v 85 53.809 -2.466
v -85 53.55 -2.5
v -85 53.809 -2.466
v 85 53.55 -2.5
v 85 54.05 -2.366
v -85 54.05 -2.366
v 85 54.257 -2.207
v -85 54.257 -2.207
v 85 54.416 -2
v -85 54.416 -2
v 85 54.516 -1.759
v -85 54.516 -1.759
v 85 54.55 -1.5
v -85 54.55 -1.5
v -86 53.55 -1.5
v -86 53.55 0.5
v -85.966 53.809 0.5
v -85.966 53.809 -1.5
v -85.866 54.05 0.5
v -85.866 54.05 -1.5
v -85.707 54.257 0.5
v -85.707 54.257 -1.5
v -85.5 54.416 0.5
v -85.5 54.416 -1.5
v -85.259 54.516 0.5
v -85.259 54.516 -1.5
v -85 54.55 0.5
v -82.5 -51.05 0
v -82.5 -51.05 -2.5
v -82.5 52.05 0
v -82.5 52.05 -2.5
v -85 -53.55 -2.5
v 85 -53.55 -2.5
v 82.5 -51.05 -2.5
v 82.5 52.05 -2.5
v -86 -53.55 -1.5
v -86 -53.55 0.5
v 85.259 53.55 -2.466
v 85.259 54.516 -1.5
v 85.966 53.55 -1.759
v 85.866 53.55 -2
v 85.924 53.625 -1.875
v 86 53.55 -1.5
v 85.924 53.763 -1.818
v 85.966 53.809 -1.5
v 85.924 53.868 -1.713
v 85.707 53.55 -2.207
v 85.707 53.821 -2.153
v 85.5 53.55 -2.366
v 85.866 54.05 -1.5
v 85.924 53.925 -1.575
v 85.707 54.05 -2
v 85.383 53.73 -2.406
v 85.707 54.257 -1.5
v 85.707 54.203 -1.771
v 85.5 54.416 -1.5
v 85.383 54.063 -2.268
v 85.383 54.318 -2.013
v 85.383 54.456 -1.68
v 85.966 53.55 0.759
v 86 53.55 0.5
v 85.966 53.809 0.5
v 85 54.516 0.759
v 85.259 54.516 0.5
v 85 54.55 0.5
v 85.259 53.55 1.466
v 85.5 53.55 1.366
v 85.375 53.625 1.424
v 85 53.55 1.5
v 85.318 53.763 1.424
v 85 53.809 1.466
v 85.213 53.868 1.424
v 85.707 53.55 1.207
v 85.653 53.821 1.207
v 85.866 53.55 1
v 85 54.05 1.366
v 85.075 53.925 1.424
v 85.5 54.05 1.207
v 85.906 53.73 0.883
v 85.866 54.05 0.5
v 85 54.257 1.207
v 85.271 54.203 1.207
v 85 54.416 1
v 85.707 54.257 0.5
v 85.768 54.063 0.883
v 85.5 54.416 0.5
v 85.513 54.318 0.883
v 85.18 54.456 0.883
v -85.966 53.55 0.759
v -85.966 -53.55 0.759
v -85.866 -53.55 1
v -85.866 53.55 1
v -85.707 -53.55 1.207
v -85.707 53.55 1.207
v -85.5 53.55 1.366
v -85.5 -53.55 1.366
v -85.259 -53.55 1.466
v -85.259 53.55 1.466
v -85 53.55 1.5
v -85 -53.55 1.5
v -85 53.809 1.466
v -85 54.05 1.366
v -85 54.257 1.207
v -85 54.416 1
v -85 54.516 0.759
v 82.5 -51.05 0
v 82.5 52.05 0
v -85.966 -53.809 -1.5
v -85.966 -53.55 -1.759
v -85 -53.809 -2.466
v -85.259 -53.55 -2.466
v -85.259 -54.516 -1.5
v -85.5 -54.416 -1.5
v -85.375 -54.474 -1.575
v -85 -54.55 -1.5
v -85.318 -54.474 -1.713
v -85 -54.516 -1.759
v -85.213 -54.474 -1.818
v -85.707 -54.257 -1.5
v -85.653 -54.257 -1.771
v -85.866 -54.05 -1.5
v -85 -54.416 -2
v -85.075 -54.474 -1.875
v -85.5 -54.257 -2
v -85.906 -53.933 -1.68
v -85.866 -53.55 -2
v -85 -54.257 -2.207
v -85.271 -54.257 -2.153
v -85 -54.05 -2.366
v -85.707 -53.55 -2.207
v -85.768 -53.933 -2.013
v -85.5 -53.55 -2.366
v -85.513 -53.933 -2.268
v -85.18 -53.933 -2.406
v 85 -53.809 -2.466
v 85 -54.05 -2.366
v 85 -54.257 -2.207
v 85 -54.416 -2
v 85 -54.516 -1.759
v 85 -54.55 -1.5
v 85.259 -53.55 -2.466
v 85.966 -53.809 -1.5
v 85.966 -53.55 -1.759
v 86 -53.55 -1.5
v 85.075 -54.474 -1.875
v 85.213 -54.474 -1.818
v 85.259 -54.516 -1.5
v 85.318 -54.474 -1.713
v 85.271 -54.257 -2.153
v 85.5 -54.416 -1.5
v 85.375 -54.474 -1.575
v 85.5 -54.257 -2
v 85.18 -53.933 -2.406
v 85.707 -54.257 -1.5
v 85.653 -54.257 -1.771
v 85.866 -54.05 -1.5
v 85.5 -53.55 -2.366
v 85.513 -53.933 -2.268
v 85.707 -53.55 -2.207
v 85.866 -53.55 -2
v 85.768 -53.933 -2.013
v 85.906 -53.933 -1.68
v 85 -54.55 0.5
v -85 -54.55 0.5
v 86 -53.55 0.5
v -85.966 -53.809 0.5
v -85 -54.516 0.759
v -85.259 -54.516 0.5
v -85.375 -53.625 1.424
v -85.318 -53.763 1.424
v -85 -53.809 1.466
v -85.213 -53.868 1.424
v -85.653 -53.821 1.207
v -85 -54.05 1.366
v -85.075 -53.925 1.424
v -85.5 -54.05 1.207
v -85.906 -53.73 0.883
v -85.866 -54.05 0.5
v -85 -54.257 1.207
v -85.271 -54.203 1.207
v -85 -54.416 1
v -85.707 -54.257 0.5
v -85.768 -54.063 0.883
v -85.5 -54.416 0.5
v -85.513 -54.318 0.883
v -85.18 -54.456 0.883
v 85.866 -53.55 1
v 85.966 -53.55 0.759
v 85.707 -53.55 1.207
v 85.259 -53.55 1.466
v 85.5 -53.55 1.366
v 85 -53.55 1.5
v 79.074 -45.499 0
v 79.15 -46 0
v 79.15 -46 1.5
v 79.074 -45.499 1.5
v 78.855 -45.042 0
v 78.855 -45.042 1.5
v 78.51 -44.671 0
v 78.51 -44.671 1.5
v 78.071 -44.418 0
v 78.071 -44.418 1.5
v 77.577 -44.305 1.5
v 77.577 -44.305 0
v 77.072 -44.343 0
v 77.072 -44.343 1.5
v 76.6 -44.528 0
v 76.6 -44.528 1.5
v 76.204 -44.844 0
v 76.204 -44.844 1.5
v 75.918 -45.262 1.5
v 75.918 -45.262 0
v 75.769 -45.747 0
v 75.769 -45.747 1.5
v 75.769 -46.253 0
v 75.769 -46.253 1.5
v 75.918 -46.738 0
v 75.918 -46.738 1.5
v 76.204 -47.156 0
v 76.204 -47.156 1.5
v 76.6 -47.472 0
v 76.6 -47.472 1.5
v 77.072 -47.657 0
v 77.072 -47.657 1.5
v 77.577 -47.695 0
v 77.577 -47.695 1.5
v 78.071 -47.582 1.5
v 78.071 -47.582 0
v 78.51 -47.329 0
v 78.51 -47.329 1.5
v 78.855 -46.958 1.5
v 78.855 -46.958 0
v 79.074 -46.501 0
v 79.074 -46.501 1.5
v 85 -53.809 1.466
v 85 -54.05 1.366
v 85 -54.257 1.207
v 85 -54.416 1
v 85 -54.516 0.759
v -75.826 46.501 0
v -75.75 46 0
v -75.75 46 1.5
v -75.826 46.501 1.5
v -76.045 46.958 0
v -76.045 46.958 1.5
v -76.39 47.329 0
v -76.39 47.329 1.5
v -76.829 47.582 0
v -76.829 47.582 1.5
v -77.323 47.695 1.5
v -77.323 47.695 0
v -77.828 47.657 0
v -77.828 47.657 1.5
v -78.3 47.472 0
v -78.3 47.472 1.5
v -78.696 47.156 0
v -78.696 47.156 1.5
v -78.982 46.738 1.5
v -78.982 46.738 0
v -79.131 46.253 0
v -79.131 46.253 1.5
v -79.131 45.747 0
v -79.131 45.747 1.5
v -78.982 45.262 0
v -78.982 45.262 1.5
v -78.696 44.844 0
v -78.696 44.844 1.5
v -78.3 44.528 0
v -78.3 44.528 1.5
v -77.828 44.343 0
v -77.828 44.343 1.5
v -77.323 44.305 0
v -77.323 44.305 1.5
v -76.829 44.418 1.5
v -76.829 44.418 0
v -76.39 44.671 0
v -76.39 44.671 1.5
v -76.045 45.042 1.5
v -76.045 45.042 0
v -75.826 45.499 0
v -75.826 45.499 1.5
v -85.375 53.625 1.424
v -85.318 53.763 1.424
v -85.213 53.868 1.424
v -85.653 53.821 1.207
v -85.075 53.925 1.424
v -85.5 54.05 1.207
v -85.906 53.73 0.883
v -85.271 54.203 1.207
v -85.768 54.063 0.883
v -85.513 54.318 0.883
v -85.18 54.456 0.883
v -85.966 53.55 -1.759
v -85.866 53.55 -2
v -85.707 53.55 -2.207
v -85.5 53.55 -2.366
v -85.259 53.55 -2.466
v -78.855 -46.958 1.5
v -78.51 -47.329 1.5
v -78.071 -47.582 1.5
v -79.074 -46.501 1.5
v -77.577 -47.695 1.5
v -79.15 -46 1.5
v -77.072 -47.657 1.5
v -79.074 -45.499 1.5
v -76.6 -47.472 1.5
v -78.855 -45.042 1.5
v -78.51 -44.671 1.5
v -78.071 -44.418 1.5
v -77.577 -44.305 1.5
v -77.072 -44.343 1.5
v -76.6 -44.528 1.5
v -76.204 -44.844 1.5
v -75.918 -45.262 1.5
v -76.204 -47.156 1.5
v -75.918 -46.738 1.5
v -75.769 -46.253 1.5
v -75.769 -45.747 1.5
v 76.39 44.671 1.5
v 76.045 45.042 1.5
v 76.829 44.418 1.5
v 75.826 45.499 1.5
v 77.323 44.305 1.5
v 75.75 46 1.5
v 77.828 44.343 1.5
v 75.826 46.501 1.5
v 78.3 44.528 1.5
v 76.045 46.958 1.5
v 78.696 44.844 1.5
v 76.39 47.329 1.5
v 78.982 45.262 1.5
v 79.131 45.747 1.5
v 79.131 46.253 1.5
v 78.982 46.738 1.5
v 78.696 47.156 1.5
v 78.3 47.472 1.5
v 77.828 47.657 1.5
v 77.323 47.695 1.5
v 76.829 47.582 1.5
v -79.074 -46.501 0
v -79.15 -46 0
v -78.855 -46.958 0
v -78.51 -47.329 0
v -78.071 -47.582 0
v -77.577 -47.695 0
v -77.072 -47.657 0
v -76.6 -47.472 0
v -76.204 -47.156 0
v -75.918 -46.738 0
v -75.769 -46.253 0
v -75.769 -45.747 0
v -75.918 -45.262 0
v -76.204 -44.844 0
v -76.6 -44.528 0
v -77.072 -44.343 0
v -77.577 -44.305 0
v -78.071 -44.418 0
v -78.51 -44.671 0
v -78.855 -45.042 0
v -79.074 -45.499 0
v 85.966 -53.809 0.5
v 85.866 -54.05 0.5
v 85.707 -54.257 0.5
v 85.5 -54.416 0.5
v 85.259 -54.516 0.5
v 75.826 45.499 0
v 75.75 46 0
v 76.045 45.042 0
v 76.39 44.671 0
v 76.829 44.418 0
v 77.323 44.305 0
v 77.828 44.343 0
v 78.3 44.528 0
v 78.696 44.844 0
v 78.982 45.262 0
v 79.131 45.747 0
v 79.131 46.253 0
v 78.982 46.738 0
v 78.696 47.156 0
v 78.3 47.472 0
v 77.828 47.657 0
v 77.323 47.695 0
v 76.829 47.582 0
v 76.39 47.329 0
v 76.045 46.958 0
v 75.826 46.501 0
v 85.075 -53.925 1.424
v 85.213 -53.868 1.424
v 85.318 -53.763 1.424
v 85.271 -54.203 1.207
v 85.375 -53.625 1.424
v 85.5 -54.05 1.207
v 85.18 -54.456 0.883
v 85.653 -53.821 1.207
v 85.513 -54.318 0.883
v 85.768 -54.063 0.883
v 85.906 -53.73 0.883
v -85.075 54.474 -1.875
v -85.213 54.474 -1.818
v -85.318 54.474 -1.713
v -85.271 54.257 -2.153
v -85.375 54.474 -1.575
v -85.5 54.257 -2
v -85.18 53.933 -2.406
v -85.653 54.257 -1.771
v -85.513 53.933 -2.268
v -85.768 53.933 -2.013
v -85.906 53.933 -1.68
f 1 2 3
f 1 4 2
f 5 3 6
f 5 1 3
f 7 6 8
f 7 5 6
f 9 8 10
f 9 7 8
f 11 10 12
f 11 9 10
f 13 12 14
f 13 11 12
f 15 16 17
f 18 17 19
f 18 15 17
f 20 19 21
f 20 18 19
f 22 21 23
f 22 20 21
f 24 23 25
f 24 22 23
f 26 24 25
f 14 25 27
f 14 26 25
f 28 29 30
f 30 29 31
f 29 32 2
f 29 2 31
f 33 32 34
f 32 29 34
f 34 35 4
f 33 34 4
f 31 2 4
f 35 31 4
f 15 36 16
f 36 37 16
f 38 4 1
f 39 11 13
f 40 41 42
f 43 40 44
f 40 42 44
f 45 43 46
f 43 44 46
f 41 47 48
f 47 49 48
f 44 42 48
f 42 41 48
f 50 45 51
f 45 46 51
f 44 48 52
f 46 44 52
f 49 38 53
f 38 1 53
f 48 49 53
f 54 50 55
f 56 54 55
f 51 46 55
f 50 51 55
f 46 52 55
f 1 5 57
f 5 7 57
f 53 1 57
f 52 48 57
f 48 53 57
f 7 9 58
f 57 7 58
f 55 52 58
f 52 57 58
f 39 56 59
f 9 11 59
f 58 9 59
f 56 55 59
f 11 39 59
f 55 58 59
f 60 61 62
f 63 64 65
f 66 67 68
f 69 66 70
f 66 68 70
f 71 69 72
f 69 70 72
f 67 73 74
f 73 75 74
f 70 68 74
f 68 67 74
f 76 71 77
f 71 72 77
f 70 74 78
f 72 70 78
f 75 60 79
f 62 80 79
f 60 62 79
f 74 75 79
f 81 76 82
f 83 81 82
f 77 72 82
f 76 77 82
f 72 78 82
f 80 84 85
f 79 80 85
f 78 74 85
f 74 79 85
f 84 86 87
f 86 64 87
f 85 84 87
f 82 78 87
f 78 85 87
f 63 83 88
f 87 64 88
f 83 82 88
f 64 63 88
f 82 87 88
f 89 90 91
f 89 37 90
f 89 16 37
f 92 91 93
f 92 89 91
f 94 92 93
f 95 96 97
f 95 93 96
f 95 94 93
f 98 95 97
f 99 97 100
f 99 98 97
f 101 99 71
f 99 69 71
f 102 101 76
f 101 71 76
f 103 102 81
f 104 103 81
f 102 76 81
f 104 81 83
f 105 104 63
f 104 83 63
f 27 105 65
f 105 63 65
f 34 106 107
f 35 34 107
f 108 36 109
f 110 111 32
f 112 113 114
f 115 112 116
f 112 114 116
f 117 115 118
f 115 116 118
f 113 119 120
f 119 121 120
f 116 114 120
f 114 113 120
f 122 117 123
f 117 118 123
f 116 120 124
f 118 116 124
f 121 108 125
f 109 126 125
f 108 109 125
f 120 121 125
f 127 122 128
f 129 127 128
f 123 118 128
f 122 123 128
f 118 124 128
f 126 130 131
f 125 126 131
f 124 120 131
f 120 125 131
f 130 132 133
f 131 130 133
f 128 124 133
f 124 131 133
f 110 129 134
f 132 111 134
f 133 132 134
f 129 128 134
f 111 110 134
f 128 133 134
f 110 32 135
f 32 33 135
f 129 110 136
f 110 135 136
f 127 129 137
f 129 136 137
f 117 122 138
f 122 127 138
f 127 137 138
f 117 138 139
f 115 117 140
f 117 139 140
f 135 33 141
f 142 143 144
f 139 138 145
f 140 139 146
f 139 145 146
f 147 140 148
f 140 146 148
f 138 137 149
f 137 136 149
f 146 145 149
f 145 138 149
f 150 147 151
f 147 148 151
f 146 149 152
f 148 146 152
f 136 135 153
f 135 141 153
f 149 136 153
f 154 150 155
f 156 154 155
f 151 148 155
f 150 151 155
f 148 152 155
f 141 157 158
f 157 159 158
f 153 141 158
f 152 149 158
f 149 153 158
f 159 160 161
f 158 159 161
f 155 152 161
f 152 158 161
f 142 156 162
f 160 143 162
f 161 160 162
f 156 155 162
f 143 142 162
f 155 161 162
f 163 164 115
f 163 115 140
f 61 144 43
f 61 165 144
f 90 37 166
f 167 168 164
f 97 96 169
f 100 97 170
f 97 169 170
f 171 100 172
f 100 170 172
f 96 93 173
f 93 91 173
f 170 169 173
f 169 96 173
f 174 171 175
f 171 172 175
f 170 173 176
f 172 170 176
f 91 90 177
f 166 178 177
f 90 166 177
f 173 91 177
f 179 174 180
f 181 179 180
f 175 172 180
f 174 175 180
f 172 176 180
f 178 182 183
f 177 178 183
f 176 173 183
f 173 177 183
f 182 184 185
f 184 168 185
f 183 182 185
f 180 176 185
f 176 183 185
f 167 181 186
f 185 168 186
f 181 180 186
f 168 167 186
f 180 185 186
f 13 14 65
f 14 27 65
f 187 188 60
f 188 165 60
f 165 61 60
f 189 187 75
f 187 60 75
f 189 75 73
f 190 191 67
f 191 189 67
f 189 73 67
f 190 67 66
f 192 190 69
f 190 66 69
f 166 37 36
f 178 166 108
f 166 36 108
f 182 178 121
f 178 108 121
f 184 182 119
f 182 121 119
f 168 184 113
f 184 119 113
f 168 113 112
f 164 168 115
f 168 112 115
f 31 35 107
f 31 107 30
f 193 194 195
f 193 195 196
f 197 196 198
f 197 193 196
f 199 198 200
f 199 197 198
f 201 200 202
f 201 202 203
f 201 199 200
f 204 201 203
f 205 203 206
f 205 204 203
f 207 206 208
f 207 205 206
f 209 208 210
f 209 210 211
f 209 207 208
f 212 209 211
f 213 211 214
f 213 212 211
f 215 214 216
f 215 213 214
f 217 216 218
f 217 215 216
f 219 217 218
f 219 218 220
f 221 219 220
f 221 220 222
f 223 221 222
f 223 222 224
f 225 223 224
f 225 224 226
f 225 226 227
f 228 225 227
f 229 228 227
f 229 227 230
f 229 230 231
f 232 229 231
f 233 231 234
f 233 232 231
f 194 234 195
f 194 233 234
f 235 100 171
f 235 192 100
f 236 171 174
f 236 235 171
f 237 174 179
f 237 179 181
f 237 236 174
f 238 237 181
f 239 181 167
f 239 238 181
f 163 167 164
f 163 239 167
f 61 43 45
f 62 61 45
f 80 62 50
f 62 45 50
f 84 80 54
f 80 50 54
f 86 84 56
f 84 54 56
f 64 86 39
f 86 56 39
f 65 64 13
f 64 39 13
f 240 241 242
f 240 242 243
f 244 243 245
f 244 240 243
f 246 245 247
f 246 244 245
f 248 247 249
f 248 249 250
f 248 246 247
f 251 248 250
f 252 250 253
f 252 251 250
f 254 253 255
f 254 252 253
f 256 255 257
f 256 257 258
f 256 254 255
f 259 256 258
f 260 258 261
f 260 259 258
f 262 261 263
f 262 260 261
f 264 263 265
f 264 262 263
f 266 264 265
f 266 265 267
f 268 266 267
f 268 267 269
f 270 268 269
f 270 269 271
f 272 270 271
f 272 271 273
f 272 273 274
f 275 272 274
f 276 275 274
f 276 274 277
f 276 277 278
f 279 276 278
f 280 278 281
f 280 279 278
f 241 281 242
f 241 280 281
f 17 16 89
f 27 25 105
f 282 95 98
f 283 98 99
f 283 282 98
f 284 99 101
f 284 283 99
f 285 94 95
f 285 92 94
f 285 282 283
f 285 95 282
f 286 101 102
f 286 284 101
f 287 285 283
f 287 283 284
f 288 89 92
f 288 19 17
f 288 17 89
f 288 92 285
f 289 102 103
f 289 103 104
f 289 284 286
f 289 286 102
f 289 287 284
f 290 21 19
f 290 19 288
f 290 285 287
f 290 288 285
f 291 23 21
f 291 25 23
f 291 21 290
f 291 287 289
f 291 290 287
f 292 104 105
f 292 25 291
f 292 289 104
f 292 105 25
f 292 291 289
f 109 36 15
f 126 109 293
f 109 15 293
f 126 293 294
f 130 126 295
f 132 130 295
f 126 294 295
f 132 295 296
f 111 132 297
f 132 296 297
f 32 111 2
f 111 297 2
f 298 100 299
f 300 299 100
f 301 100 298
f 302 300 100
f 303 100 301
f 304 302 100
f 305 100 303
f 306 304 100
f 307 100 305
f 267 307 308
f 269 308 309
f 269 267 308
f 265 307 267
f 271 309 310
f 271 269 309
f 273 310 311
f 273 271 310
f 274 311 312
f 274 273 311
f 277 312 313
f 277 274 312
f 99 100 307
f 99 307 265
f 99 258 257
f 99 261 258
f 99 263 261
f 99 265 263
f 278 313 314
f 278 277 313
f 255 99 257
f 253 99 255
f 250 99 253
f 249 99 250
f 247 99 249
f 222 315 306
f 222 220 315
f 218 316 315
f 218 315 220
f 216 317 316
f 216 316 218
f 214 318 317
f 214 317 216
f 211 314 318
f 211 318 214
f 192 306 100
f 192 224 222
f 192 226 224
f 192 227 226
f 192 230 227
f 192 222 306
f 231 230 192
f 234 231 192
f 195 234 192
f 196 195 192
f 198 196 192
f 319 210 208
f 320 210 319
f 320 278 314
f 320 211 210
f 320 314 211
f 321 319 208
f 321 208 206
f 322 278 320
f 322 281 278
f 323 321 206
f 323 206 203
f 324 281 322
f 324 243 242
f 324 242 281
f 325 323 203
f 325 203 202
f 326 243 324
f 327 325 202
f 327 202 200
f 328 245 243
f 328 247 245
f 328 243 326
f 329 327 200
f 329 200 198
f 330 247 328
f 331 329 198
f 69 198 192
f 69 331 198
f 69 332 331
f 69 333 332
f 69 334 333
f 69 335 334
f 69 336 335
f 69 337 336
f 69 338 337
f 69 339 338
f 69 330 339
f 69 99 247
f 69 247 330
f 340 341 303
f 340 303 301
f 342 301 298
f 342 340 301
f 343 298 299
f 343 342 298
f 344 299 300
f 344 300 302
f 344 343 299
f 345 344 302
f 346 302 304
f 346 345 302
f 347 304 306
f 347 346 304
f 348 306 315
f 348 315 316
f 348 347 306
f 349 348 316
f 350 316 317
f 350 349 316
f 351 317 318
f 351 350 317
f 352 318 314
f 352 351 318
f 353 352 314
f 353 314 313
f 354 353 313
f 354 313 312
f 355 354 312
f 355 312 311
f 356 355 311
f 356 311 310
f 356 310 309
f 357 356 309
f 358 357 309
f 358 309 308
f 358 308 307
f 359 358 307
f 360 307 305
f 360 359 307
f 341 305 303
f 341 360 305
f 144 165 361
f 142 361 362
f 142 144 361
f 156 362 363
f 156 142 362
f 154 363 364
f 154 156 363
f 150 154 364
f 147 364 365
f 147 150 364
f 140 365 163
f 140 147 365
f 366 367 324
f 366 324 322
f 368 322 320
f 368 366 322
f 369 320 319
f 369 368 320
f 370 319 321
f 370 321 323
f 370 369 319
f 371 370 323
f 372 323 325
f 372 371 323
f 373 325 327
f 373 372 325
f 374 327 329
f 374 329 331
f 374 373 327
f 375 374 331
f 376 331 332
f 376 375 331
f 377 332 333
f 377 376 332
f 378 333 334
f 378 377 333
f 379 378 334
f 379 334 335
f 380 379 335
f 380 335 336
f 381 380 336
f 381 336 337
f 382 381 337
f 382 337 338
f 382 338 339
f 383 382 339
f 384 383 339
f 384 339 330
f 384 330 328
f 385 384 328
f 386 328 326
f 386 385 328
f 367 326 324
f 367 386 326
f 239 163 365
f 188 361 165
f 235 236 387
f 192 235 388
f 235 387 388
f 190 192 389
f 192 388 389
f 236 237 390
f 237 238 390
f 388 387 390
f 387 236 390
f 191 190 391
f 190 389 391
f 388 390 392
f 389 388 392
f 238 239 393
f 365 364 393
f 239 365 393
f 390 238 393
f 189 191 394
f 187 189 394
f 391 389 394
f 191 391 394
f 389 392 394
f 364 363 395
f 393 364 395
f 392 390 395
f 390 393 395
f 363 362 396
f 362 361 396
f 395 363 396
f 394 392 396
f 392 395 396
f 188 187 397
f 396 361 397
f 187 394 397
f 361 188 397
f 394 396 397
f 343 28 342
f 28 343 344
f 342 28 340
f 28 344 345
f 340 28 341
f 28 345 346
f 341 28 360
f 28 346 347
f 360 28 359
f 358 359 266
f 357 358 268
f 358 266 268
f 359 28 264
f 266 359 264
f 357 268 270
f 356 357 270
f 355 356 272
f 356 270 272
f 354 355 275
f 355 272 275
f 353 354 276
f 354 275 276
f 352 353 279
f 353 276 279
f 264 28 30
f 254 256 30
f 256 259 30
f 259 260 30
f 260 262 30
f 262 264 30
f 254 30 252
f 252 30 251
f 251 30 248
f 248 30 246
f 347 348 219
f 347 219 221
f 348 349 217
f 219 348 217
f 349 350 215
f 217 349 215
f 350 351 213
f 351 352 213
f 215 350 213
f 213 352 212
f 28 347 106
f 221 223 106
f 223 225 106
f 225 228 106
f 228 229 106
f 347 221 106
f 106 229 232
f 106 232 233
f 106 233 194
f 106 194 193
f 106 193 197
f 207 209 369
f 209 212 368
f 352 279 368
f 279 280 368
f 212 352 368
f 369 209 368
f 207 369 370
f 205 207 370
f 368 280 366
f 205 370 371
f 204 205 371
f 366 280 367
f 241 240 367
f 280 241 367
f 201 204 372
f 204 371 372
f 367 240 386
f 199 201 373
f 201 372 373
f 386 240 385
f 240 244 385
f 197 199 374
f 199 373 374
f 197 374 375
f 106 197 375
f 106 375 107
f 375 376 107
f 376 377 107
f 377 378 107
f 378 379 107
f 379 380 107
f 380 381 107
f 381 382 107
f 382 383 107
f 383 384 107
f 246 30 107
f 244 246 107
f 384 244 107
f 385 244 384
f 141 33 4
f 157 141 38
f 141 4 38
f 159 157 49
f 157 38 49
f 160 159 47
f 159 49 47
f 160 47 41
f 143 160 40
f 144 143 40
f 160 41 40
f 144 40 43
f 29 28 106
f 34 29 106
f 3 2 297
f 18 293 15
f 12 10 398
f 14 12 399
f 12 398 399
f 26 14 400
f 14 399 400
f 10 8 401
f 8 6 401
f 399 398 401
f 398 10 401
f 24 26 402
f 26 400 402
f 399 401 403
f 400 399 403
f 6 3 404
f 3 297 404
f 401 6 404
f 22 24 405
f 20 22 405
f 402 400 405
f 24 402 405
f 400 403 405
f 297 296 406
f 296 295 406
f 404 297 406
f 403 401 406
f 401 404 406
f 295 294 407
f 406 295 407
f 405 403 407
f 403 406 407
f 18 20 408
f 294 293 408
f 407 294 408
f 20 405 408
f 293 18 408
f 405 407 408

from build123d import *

# Parameters (mm, degrees)
SKETCH1_W           = 165
SKETCH1_H           = 102.1
SKETCH1_R           = 1.7
BOSS_EXTRUDE1_DEPTH = 1.5
SKETCH2_W           = 172
SKETCH2_H           = 109.1
SKETCH2_W_2         = 165
SKETCH2_H_2         = 102.1
BOSS_EXTRUDE2_DEPTH = 4
SKETCH3_W           = 165
SKETCH3_H           = 1
CUT_EXTRUDE1_DEPTH  = 2.5
FILLET1_R           = 1


with BuildPart() as part:
    # Sketch1 → Boss-Extrude1 (new body)
    with BuildSketch(Plane.XY):
        Rectangle(SKETCH1_W, SKETCH1_H)
        with Locations((-77.45, 46)):
            Circle(SKETCH1_R, mode=Mode.SUBTRACT)
        with Locations(Location((77.45, 46, 0), (0, 0, 180))):
            Circle(SKETCH1_R, mode=Mode.SUBTRACT)
        with Locations((77.45, -46)):
            Circle(SKETCH1_R, mode=Mode.SUBTRACT)
        with Locations(Location((-77.45, -46, 0), (0, 0, 180))):
            Circle(SKETCH1_R, mode=Mode.SUBTRACT)
    extrude(amount=BOSS_EXTRUDE1_DEPTH)

    # Sketch2 → Boss-Extrude2 (add)
    with BuildSketch(Plane.XY.offset(1.5)):
        Rectangle(SKETCH2_W, SKETCH2_H)
        Rectangle(SKETCH2_W_2, SKETCH2_H_2, mode=Mode.SUBTRACT)
    extrude(amount=-BOSS_EXTRUDE2_DEPTH)

    # Sketch3 → Cut-Extrude1 (cut)
    with BuildSketch(Plane(origin=(0, 0, -2.5), x_dir=(-1, 0, 0), z_dir=(0, 0, -1))):
        with Locations((0, 51.55)):
            Rectangle(SKETCH3_W, SKETCH3_H)
    extrude(amount=-CUT_EXTRUDE1_DEPTH, mode=Mode.SUBTRACT)

    # Fillet1
    fillet1_edges = [part.edges().sort_by_distance(p)[0] for p in [
        (-86, 0, -2.5),
        (-86, -54.55, -0.5),
        (0, 54.55, -2.5),
        (-86, 54.55, -0.5),
        (86, 0, -2.5),
        (86, 54.55, -0.5),
        (0, -54.55, -2.5),
        (86, -54.55, -0.5),
        (-86, 0, 1.5),
        (0, -54.55, 1.5),
        (86, 0, 1.5),
        (0, 54.55, 1.5),
    ]]
    fillet(fillet1_edges, radius=FILLET1_R)


solid = part.part
